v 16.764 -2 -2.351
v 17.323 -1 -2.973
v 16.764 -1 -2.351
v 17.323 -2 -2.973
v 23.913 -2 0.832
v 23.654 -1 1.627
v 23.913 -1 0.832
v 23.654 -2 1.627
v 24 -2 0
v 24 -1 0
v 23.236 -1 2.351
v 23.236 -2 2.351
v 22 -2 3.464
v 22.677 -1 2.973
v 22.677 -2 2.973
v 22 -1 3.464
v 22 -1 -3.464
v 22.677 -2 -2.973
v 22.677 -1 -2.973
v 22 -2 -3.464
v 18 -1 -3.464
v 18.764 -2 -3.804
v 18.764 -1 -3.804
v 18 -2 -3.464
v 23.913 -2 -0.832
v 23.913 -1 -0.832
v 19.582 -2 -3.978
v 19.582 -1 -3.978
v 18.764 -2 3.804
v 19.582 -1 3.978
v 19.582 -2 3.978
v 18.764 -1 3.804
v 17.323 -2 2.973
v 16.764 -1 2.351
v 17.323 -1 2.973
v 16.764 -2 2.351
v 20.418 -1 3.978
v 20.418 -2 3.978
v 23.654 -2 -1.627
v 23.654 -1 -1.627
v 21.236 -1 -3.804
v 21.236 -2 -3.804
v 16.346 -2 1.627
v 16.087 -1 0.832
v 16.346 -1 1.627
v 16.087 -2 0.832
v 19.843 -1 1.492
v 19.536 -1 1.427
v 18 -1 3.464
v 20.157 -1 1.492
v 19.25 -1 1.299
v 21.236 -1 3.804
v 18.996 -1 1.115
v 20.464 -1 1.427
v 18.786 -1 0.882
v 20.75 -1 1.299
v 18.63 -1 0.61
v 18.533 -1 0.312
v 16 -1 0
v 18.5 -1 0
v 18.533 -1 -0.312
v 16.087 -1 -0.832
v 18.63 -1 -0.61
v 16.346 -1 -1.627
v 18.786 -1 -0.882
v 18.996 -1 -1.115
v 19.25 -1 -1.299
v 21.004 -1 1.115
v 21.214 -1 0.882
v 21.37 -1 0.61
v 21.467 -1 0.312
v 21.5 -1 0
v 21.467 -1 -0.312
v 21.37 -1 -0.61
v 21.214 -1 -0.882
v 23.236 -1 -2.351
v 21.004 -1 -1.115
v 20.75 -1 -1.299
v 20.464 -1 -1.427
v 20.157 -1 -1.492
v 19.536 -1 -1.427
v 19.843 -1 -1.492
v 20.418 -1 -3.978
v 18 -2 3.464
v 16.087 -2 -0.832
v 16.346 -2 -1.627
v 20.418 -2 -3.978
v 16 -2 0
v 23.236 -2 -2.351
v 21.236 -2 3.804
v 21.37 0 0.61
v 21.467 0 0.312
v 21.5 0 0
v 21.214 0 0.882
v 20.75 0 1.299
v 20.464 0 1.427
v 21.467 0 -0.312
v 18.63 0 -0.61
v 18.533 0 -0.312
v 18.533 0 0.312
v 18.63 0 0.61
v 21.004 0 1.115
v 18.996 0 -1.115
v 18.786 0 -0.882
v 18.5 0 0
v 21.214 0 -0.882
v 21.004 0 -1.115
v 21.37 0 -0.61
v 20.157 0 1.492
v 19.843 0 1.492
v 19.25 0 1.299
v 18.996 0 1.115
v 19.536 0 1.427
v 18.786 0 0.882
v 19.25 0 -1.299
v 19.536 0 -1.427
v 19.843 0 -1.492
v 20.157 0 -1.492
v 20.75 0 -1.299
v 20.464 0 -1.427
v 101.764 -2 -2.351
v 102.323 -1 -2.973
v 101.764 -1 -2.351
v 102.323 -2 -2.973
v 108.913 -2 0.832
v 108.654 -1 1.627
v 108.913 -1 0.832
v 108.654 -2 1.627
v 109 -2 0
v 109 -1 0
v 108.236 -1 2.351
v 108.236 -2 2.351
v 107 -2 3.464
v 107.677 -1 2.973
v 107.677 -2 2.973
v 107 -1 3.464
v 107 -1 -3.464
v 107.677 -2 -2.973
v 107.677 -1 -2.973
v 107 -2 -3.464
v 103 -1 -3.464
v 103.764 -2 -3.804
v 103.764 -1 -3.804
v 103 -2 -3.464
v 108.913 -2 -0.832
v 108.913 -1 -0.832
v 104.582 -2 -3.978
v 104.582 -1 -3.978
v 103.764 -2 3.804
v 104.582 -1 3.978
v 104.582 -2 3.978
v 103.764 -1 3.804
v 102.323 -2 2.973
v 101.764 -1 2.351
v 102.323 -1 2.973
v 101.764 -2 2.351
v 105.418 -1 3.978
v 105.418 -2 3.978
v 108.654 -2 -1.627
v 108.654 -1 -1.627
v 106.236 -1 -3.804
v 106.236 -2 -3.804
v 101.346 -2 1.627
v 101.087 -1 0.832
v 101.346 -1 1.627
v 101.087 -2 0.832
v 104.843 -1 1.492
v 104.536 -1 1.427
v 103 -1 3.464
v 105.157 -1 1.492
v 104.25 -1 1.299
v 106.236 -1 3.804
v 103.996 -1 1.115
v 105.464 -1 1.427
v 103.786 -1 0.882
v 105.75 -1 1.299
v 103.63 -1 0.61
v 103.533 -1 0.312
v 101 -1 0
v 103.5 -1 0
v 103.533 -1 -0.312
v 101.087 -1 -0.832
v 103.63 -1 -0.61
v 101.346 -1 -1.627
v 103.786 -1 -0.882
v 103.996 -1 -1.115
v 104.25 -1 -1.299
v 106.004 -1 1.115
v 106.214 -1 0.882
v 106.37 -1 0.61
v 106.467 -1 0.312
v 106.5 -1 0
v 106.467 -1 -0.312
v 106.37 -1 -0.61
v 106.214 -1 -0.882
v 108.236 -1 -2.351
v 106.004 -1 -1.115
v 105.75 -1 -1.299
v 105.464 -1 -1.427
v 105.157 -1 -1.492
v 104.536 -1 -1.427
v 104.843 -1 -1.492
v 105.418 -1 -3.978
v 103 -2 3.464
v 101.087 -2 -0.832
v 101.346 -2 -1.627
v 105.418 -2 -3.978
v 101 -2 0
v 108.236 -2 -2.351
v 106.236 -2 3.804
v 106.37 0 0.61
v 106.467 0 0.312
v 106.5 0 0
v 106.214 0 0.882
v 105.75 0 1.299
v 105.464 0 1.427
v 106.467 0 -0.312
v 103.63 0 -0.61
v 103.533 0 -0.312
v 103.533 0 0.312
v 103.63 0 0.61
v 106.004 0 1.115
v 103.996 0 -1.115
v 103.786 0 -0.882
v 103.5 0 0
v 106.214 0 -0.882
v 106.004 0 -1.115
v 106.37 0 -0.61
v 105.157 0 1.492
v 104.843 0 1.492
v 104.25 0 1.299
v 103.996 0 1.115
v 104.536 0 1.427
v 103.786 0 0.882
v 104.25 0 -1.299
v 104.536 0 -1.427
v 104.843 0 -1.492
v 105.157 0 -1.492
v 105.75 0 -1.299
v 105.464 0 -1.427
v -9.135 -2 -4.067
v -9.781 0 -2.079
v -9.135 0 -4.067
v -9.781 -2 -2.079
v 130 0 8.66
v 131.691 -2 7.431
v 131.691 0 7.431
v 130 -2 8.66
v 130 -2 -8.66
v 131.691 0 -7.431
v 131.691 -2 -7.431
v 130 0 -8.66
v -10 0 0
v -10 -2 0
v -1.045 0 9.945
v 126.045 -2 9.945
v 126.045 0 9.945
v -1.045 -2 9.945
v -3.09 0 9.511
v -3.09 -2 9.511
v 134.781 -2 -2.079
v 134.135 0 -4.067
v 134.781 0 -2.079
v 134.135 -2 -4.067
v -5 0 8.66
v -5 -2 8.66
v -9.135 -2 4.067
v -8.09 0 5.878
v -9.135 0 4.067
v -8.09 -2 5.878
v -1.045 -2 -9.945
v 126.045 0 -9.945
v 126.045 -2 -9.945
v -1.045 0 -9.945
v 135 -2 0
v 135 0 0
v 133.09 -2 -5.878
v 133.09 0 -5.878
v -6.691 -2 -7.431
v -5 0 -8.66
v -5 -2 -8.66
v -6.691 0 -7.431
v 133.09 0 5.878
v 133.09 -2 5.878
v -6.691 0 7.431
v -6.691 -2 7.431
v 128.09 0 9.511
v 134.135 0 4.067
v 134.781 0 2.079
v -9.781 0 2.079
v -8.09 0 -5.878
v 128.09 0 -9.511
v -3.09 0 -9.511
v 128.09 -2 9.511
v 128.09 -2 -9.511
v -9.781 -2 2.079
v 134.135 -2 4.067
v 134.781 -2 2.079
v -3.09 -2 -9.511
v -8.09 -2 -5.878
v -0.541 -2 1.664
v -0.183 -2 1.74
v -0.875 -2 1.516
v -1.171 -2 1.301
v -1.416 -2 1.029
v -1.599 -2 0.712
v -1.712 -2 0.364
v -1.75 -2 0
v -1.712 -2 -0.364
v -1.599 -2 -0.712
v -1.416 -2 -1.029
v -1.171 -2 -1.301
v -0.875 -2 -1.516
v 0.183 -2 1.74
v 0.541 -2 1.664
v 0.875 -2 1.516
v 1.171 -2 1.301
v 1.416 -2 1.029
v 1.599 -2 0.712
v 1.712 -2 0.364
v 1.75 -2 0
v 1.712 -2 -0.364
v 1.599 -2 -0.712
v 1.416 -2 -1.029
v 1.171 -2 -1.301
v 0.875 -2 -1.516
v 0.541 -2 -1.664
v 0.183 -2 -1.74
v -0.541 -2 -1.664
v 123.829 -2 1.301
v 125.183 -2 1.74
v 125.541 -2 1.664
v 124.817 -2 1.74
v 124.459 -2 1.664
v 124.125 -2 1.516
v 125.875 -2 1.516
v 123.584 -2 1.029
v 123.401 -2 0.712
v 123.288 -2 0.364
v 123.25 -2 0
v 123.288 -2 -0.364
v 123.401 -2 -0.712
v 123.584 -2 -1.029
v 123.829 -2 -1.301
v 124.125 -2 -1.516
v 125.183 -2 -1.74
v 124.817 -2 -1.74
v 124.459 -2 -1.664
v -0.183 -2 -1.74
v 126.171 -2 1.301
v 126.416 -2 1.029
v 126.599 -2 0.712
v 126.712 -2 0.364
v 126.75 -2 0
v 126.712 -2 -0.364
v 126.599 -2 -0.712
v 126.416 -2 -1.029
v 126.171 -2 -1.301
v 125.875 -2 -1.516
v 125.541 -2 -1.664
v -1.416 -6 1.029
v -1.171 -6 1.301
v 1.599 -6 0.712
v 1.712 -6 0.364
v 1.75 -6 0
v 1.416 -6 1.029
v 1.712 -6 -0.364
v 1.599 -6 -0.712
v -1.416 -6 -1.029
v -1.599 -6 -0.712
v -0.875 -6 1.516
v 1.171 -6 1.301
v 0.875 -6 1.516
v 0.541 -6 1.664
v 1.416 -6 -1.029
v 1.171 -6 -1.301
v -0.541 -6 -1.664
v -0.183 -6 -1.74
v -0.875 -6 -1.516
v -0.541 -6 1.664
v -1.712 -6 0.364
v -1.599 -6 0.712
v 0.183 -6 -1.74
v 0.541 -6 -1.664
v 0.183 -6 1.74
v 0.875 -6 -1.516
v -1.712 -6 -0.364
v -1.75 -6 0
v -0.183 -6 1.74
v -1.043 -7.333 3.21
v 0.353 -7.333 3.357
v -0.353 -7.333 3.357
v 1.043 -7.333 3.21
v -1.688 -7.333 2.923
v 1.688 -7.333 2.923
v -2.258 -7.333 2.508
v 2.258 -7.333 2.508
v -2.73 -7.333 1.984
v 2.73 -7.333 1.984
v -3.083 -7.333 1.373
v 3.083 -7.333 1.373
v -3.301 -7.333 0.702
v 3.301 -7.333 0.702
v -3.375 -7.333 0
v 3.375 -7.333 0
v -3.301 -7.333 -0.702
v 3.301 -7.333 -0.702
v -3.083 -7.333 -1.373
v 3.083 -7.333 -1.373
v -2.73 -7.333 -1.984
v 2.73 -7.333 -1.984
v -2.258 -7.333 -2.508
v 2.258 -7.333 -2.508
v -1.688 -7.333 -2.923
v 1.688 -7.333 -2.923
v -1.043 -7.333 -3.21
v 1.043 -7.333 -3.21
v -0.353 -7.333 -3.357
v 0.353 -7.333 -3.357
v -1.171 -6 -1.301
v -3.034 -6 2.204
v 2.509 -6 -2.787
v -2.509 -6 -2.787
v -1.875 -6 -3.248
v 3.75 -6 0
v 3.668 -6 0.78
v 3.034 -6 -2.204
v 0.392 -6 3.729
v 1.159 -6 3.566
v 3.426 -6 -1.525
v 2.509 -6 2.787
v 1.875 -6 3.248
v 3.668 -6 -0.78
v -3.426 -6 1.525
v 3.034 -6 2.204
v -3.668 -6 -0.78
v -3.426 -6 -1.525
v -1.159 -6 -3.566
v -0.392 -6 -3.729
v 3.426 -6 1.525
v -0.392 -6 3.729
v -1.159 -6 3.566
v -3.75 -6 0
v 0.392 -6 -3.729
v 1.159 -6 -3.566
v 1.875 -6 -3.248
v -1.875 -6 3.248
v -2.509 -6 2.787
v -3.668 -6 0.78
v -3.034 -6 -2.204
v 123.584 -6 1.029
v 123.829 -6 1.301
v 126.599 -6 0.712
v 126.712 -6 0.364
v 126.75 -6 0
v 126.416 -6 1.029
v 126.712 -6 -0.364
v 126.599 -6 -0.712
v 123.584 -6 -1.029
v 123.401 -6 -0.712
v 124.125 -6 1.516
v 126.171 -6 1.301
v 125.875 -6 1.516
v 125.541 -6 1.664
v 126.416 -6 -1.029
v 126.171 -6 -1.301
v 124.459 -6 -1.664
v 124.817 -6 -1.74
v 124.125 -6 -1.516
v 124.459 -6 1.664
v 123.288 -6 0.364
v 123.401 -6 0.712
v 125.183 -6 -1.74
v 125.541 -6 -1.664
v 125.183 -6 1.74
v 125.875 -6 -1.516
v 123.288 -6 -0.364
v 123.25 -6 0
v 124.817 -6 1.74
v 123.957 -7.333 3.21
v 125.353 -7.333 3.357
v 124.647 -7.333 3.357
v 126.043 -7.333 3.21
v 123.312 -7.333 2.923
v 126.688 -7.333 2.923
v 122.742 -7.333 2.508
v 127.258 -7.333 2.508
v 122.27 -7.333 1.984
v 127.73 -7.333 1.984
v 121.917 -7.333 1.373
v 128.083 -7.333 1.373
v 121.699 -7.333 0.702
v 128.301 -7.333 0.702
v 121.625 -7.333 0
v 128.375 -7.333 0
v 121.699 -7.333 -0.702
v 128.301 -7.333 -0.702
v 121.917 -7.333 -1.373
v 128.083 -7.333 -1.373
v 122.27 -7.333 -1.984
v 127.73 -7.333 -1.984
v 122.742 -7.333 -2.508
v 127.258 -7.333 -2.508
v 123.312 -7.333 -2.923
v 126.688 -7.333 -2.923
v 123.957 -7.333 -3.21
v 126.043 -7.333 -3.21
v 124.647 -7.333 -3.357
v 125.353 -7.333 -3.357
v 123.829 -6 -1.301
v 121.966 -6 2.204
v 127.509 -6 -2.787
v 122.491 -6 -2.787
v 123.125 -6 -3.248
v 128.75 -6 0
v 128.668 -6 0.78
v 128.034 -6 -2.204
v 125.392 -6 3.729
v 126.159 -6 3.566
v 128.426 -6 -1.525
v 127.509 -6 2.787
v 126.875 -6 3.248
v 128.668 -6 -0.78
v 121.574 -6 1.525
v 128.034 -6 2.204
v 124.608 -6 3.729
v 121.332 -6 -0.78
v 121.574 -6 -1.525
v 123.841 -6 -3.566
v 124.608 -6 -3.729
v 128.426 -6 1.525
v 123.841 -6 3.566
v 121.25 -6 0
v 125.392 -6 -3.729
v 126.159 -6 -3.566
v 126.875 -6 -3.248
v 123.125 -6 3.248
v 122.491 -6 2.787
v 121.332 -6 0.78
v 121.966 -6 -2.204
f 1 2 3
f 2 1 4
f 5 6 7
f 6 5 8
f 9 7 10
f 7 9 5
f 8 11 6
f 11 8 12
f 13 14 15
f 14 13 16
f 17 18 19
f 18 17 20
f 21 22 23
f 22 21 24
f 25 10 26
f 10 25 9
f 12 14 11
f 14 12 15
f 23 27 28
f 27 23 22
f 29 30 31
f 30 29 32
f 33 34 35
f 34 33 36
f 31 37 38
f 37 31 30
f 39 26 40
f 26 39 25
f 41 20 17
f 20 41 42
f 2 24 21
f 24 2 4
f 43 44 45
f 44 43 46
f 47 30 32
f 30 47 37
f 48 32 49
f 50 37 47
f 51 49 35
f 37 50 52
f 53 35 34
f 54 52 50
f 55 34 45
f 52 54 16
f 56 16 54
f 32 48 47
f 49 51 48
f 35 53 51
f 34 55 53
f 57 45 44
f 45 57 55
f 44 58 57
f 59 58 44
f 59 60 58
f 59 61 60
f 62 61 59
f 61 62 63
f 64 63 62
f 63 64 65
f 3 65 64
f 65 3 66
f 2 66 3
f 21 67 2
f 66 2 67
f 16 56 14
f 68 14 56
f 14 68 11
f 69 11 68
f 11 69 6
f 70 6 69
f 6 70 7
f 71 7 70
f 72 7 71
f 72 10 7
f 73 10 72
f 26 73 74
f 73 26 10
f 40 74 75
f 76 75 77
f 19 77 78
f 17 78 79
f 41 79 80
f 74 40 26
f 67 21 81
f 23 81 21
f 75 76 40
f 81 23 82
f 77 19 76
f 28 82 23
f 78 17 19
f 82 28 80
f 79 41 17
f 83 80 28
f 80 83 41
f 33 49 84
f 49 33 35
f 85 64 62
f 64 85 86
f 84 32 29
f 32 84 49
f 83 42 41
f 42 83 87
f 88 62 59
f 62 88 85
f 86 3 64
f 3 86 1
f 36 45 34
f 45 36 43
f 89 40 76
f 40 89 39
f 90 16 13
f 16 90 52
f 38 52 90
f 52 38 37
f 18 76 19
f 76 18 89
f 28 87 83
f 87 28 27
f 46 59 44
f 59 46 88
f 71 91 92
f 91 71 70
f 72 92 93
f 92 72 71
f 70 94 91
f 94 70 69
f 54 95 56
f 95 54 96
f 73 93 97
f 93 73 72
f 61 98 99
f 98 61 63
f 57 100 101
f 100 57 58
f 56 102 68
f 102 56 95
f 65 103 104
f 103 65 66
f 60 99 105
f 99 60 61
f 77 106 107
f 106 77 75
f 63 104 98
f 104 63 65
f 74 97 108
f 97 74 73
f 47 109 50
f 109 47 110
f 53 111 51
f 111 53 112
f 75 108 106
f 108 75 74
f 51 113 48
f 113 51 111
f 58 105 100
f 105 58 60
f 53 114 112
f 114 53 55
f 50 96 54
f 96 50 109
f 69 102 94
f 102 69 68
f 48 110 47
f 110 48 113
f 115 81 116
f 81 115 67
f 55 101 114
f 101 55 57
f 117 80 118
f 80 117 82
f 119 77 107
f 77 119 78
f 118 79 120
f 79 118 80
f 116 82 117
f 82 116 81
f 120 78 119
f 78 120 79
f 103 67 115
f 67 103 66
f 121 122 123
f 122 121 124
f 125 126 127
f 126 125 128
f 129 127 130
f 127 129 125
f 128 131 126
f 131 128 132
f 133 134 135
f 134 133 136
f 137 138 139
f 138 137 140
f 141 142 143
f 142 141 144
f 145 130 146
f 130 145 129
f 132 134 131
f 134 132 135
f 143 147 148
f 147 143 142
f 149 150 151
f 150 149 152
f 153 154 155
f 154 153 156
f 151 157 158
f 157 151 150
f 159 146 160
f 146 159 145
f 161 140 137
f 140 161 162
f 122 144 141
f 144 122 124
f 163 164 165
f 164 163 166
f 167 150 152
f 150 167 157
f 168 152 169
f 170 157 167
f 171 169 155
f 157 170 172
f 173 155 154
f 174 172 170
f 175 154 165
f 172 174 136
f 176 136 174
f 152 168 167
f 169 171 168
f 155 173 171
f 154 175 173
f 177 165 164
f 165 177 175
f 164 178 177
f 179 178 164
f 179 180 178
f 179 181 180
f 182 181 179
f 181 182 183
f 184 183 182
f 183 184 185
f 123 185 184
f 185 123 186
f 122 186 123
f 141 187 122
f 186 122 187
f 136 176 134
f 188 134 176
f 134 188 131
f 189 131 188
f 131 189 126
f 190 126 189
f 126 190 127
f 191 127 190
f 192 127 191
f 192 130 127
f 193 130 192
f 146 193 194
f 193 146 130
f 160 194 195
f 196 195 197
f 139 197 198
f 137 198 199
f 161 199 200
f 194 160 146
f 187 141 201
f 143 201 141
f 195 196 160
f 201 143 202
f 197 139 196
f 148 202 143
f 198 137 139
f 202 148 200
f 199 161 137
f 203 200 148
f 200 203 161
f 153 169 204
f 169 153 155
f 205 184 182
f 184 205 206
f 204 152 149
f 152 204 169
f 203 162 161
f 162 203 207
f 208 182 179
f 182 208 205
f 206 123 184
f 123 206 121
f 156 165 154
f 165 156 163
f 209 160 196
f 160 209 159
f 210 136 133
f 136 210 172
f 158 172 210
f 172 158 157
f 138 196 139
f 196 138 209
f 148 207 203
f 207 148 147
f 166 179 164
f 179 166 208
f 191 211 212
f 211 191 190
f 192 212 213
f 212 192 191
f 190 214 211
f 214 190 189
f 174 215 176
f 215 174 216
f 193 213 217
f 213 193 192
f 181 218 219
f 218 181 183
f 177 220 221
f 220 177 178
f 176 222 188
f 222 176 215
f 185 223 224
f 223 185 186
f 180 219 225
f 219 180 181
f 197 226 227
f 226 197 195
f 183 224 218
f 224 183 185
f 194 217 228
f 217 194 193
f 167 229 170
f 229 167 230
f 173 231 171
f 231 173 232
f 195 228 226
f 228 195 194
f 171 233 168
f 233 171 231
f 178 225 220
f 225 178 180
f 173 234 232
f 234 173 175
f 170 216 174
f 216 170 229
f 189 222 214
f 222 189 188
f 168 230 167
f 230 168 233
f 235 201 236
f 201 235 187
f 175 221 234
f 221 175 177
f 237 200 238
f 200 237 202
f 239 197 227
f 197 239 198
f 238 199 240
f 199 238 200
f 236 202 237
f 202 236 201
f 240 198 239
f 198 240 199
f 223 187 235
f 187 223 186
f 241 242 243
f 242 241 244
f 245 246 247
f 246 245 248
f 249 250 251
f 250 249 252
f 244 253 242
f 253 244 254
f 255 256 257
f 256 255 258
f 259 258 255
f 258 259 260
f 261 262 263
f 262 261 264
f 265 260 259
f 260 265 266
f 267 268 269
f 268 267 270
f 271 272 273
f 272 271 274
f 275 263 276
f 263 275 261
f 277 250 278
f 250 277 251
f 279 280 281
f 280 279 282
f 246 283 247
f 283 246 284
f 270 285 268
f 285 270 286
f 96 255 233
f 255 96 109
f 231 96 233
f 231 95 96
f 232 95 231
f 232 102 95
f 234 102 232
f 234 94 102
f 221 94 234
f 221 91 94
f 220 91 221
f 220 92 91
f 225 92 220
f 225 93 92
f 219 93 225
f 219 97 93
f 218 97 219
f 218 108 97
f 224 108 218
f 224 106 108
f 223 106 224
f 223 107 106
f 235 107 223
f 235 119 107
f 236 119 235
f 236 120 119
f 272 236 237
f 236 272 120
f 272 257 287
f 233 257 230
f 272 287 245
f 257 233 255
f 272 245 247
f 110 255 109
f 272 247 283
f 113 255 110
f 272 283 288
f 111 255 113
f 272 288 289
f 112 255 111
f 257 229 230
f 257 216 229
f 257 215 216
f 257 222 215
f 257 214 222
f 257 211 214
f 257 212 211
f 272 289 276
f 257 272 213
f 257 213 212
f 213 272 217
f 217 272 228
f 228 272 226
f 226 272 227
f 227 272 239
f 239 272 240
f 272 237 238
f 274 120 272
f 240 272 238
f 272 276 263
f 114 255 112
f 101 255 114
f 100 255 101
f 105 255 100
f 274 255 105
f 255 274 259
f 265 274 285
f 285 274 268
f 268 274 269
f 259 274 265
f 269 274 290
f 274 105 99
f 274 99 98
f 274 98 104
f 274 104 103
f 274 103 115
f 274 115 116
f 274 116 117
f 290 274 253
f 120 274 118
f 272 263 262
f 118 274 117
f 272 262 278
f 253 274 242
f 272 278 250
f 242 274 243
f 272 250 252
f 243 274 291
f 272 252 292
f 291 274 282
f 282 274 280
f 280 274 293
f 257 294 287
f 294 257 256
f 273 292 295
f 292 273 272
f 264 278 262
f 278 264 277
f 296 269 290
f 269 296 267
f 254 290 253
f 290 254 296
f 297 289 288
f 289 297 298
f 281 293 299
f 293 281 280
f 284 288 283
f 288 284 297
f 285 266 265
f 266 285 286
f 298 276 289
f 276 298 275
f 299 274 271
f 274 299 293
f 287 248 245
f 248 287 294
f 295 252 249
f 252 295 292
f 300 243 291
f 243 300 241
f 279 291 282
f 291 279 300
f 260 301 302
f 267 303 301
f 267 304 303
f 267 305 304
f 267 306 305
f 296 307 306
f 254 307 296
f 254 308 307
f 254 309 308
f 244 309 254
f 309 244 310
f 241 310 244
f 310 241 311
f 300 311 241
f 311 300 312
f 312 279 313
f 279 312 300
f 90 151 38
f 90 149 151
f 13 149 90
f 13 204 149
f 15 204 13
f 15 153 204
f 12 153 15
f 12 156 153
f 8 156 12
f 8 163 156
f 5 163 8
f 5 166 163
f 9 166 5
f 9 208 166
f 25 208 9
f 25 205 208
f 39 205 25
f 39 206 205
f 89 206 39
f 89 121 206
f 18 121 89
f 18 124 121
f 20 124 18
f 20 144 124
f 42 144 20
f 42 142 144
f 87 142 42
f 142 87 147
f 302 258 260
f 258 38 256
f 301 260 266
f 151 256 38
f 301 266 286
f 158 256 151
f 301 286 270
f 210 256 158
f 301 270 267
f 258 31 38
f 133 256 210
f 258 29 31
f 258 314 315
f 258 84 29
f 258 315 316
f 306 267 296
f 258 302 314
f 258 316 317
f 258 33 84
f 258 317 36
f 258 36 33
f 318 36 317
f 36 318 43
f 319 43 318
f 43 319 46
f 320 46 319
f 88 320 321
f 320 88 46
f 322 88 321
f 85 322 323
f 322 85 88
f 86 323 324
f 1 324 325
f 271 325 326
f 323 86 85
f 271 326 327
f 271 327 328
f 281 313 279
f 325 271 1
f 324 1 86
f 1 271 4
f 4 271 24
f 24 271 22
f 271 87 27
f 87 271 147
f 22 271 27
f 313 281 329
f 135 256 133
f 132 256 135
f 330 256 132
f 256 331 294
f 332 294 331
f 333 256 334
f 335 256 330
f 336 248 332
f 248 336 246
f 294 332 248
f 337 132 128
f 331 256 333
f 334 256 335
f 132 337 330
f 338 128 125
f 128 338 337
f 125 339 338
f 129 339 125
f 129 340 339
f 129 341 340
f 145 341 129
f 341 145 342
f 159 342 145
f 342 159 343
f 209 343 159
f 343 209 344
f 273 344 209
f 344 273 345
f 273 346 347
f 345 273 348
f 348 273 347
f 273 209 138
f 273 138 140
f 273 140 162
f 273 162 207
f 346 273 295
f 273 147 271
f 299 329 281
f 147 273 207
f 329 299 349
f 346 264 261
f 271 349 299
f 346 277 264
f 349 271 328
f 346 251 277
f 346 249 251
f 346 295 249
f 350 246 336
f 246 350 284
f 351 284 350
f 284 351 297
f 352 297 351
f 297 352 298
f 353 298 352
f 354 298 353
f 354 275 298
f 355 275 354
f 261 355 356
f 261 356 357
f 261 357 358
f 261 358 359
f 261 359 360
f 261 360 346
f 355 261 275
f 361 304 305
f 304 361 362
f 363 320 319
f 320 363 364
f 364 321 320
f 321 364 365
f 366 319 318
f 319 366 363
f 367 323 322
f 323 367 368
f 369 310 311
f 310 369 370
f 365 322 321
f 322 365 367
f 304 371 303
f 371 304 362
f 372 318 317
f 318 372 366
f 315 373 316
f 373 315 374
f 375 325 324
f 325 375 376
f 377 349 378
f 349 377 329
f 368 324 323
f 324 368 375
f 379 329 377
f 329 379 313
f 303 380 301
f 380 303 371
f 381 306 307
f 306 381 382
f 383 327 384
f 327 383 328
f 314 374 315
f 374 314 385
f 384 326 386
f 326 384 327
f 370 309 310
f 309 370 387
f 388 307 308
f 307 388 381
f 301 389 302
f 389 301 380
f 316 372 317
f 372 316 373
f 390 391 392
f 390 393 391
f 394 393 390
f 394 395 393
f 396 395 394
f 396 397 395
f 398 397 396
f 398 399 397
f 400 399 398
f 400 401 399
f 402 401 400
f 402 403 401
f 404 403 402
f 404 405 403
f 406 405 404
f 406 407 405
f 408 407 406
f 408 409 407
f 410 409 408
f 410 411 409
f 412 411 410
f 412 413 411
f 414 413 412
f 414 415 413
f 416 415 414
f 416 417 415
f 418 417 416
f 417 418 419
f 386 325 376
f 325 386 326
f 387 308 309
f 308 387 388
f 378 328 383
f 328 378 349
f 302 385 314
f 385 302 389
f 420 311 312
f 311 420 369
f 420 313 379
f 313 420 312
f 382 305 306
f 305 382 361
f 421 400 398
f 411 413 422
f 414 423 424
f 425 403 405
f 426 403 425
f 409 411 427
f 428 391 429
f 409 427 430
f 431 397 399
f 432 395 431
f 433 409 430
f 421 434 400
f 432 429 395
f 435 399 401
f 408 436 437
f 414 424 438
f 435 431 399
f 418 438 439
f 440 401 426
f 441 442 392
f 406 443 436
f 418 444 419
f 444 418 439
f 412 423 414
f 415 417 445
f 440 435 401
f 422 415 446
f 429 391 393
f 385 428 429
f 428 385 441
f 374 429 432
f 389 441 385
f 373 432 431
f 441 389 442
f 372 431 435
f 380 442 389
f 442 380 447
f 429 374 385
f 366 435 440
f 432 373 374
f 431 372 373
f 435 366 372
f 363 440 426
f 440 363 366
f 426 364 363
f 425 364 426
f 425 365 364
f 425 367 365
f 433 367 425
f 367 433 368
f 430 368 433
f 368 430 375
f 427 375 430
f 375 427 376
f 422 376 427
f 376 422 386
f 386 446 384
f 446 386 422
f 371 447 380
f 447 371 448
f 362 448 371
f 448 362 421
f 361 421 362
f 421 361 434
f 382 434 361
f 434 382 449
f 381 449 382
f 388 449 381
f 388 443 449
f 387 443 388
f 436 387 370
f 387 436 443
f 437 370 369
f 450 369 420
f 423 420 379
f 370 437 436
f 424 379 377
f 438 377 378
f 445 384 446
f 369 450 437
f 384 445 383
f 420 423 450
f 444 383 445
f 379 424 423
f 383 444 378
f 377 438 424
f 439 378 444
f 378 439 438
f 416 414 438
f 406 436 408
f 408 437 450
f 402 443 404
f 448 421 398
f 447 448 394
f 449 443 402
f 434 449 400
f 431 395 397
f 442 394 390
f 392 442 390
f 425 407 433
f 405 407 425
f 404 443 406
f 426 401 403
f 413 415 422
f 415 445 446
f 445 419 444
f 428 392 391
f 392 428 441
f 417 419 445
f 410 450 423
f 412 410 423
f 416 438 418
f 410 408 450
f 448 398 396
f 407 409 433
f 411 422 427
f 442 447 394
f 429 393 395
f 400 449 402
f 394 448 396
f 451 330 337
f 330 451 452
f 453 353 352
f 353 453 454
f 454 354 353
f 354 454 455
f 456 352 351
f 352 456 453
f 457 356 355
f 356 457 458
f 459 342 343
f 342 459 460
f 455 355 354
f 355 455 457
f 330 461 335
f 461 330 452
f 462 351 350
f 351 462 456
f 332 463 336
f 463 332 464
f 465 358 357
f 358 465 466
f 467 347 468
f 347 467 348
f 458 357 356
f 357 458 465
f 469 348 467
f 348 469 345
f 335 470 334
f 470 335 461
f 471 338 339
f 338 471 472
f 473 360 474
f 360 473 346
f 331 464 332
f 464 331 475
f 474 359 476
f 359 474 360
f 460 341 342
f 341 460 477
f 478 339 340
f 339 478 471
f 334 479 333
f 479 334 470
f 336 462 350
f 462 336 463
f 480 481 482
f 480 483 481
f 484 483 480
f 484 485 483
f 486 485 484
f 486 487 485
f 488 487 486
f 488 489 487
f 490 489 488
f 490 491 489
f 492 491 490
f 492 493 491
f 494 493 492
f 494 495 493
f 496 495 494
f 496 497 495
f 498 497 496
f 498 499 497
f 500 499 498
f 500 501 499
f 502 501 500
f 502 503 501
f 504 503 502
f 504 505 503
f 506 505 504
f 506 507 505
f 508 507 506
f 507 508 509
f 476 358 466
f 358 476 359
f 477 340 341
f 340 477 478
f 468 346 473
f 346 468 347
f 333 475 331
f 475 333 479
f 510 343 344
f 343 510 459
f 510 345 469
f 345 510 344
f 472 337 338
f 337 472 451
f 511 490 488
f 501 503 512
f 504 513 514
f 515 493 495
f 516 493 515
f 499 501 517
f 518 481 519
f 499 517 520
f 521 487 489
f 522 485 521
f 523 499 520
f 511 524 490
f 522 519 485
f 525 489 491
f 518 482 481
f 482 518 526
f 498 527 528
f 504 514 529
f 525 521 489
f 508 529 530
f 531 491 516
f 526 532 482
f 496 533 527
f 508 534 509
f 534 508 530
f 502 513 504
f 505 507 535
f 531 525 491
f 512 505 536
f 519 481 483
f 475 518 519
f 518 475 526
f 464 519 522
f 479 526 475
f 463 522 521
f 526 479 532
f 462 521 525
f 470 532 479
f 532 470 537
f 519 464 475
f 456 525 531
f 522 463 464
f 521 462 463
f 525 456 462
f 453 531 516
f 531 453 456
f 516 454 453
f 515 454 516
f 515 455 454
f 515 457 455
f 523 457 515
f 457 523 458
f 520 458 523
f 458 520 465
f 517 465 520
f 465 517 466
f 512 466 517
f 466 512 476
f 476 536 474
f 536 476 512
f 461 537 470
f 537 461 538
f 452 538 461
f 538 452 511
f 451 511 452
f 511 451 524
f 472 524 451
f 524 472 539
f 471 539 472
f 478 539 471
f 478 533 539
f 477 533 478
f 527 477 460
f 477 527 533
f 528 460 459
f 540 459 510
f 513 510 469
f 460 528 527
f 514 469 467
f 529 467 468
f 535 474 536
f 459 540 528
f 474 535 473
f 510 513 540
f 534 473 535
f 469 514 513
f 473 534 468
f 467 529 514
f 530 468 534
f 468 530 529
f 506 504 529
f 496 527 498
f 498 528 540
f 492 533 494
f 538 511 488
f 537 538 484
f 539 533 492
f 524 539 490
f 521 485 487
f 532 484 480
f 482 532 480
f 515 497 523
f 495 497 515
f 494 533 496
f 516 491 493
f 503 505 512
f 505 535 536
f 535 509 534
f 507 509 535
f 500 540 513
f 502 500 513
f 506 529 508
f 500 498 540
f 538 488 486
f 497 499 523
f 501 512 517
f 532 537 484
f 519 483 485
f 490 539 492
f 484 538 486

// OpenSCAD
/* Measurements from the TiVo */
hole_separation = 125;
max_diameter = 9;
min_diameter = 4.5;
hole_depth = 8;
pad_height = 3.5;

/* Measurements for the mount */
plate_thickness = 2;
cap_diameter = max_diameter - 1.5;
shaft_diameter = min_diameter - 1;
pin_height = hole_depth * 2/3;
cap_height = pin_height - hole_depth*0.5;

$fs = 0.1;

module pin() {
  cylinder(h = pin_height, d = shaft_diameter);
  translate([0, 0, pin_height - cap_height]) {
    cylinder(h = cap_height, d1 = cap_diameter, d2 = cap_diameter*0.9);
  }
}

module screw_hole() {
  translate([0, 0, 1]) cylinder(h = 2, r = 4);
  translate([0, 0, -1]) cylinder(h = plate_thickness + 2, r = 1.5);
}

rotate([90, 0, 0]) {
  difference() {
    linear_extrude(plate_thickness) {
      hull() {
        circle(10);
        translate([hole_separation, 0, 0]) circle(10);
      }
    }

    translate([20, 0, 0]) screw_hole();
    translate([hole_separation - 20, 0, 0]) screw_hole();
  }

  translate([0, 0, plate_thickness]) {
    pin();
    translate([hole_separation, 0, 0]) pin();
  }
}
